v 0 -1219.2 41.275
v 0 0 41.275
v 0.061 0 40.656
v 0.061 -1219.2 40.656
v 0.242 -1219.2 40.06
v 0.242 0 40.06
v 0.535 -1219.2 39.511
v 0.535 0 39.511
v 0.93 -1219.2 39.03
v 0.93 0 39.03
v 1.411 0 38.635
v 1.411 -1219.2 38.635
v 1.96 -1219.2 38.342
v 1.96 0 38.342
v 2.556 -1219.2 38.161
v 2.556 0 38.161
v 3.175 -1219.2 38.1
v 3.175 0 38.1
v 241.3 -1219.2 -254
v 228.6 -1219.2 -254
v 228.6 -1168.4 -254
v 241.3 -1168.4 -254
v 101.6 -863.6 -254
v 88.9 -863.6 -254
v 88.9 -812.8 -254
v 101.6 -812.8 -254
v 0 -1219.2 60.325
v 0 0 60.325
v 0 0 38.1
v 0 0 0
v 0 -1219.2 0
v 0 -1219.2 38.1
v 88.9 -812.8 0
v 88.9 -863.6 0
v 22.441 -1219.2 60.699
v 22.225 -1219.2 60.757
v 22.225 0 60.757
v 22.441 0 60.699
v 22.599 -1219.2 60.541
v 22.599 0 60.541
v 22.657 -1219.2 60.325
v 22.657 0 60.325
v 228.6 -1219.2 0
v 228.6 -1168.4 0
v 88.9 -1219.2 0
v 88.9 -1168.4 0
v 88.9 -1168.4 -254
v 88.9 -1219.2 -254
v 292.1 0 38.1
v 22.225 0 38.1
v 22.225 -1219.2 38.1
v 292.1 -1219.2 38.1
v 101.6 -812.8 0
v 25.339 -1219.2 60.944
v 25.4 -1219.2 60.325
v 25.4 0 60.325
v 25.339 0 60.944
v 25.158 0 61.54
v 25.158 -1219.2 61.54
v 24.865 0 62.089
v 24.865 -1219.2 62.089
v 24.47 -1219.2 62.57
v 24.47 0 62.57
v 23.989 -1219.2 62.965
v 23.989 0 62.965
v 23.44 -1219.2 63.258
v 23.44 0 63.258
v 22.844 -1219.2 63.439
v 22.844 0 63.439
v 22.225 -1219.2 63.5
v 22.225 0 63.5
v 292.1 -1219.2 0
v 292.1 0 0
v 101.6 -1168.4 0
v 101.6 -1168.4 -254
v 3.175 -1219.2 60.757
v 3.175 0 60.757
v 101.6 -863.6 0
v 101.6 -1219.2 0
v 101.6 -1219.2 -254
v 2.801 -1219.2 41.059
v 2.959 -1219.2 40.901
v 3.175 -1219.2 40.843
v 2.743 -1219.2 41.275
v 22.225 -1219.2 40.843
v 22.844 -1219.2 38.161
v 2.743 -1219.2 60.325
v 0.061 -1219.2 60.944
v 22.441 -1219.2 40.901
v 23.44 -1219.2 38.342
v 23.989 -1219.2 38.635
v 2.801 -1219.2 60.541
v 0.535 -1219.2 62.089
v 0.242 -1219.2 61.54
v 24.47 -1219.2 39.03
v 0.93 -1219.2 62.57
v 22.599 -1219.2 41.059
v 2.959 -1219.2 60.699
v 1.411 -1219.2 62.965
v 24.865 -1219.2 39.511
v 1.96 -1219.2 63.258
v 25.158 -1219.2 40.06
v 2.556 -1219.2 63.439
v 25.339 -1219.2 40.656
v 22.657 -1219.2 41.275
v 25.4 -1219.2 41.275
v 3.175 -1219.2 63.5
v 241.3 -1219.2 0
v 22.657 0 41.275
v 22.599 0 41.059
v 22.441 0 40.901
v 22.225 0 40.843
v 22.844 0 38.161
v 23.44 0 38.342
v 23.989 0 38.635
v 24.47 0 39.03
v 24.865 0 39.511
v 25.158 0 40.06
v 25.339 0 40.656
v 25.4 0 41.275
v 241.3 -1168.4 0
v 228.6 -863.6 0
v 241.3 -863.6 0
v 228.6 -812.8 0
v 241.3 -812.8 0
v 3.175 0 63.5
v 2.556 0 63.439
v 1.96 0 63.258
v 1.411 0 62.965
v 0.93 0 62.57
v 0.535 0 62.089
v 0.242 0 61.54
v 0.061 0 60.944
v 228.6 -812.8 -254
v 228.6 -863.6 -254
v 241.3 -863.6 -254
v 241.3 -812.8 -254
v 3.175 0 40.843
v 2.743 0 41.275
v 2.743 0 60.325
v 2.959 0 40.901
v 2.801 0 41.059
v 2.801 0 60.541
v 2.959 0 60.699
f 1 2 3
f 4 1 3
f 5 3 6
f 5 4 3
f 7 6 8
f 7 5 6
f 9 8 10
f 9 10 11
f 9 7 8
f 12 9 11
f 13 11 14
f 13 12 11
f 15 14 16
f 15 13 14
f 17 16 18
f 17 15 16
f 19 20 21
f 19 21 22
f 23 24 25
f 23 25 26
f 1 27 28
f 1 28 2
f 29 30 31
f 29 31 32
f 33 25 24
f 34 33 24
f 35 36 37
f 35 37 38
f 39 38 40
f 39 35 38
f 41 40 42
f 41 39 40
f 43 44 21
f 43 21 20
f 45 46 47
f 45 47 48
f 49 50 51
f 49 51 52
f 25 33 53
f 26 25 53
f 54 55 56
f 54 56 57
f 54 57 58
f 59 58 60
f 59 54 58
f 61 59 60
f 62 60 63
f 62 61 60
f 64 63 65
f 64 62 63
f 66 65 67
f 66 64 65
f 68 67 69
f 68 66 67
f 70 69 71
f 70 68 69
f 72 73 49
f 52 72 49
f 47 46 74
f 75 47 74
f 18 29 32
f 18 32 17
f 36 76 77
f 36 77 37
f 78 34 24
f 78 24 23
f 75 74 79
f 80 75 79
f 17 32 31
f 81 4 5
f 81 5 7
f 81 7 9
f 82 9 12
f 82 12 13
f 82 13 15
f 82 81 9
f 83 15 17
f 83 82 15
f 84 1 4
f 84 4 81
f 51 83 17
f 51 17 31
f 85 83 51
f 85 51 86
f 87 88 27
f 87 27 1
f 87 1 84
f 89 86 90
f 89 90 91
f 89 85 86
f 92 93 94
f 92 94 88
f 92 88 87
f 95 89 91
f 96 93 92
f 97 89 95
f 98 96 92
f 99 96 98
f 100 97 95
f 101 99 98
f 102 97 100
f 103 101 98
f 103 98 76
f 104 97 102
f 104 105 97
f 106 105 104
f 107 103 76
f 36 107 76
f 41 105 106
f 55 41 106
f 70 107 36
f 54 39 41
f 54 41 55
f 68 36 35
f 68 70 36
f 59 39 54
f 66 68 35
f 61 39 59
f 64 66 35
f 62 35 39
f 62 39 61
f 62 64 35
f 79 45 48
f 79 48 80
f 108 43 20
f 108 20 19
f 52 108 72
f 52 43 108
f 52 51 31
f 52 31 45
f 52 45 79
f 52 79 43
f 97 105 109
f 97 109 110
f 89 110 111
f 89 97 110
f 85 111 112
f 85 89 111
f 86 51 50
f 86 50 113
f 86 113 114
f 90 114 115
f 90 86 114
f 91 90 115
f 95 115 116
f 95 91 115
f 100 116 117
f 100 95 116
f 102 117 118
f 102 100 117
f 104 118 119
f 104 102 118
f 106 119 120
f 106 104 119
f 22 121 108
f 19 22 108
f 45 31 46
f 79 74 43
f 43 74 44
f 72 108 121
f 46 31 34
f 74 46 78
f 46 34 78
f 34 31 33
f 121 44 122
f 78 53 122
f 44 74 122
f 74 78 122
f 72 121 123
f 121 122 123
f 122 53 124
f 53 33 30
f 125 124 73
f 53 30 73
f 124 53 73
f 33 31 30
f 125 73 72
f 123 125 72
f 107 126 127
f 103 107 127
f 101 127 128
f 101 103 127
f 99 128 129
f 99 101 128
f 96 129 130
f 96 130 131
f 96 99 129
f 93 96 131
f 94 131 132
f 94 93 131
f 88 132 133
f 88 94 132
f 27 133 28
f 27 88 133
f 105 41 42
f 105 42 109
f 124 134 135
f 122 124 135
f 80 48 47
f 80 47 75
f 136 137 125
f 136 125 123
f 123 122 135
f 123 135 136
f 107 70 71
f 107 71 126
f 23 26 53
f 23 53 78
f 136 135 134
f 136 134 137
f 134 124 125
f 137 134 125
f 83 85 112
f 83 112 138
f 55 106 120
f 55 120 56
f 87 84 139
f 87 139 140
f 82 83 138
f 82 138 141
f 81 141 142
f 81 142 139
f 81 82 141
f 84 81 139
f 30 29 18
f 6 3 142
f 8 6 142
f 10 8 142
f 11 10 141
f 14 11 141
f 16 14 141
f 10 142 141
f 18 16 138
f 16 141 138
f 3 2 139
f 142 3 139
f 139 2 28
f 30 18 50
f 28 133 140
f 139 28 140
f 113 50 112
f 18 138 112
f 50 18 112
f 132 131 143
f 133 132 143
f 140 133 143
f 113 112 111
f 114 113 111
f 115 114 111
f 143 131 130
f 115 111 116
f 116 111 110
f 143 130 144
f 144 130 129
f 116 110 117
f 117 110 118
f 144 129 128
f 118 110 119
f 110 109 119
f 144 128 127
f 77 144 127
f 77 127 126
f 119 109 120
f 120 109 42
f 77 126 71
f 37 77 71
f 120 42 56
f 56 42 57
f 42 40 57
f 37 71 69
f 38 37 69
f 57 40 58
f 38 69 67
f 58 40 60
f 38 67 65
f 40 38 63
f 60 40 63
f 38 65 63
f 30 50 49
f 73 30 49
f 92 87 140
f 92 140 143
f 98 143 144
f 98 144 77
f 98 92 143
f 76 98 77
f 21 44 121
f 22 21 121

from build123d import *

# Parameters (mm, degrees)
F0_W     = 292.1
F0_H     = 38.1
F1_DEPTH = 1219.2
F3_DEPTH = 1219.2
F4_W     = 12.7
F4_H     = 50.8
F5_DEPTH = 254


with BuildPart() as f1:
    # F0 (on Front) → F1 (new body)
    with BuildSketch(Plane.XZ):
        with Locations((146.05, 19.05)):
            Rectangle(F0_W, F0_H)
    extrude(amount=F1_DEPTH)

    # F2 (on face) → F3 (join)
    with BuildSketch(Plane.XZ.offset(1219.2)):
        with BuildLine():
            ThreePointArc((0, 41.275), (0.929936, 39.029936), (3.175, 38.1))
            Line((3.175, 38.1), (22.225, 38.1))
            ThreePointArc((22.225, 38.1), (24.470064, 39.029936), (25.4, 41.275))
            Line((25.4, 41.275), (25.4, 60.325))
            ThreePointArc((25.4, 60.325), (24.470064, 62.570064), (22.225, 63.5))
            Line((22.225, 63.5), (3.175, 63.5))
            ThreePointArc((3.175, 63.5), (0.929936, 62.570064), (0, 60.325))
            Line((0, 60.325), (0, 41.275))
        make_face()
        with BuildLine():
            ThreePointArc((22.6568, 41.275), (22.530329, 40.969671), (22.225, 40.8432))
            Line((22.225, 40.8432), (3.175, 40.8432))
            ThreePointArc((3.175, 40.8432), (2.869671, 40.969671), (2.7432, 41.275))
            Line((2.7432, 41.275), (2.7432, 60.325))
            ThreePointArc((2.7432, 60.325), (2.869671, 60.630329), (3.175, 60.7568))
            Line((3.175, 60.7568), (22.225, 60.7568))
            ThreePointArc((22.225, 60.7568), (22.530329, 60.630329), (22.6568, 60.325))
            Line((22.6568, 60.325), (22.6568, 41.275))
        make_face(mode=Mode.SUBTRACT)
    extrude(amount=-F3_DEPTH)

    # F4 (on face) → F5 (join)
    with BuildSketch(Plane(origin=(0, 0, 0), x_dir=(1, 0, 0), z_dir=(0, 0, -1))):
        with Locations((95.25, 1193.8)):
            Rectangle(F4_W, F4_H)
        with Locations((234.95, 1193.8)):
            Rectangle(F4_W, F4_H)
        with Locations((95.25, 838.2)):
            Rectangle(F4_W, F4_H)
        with Locations((234.95, 838.2)):
            Rectangle(F4_W, F4_H)
    extrude(amount=F5_DEPTH)


solid = f1.part
